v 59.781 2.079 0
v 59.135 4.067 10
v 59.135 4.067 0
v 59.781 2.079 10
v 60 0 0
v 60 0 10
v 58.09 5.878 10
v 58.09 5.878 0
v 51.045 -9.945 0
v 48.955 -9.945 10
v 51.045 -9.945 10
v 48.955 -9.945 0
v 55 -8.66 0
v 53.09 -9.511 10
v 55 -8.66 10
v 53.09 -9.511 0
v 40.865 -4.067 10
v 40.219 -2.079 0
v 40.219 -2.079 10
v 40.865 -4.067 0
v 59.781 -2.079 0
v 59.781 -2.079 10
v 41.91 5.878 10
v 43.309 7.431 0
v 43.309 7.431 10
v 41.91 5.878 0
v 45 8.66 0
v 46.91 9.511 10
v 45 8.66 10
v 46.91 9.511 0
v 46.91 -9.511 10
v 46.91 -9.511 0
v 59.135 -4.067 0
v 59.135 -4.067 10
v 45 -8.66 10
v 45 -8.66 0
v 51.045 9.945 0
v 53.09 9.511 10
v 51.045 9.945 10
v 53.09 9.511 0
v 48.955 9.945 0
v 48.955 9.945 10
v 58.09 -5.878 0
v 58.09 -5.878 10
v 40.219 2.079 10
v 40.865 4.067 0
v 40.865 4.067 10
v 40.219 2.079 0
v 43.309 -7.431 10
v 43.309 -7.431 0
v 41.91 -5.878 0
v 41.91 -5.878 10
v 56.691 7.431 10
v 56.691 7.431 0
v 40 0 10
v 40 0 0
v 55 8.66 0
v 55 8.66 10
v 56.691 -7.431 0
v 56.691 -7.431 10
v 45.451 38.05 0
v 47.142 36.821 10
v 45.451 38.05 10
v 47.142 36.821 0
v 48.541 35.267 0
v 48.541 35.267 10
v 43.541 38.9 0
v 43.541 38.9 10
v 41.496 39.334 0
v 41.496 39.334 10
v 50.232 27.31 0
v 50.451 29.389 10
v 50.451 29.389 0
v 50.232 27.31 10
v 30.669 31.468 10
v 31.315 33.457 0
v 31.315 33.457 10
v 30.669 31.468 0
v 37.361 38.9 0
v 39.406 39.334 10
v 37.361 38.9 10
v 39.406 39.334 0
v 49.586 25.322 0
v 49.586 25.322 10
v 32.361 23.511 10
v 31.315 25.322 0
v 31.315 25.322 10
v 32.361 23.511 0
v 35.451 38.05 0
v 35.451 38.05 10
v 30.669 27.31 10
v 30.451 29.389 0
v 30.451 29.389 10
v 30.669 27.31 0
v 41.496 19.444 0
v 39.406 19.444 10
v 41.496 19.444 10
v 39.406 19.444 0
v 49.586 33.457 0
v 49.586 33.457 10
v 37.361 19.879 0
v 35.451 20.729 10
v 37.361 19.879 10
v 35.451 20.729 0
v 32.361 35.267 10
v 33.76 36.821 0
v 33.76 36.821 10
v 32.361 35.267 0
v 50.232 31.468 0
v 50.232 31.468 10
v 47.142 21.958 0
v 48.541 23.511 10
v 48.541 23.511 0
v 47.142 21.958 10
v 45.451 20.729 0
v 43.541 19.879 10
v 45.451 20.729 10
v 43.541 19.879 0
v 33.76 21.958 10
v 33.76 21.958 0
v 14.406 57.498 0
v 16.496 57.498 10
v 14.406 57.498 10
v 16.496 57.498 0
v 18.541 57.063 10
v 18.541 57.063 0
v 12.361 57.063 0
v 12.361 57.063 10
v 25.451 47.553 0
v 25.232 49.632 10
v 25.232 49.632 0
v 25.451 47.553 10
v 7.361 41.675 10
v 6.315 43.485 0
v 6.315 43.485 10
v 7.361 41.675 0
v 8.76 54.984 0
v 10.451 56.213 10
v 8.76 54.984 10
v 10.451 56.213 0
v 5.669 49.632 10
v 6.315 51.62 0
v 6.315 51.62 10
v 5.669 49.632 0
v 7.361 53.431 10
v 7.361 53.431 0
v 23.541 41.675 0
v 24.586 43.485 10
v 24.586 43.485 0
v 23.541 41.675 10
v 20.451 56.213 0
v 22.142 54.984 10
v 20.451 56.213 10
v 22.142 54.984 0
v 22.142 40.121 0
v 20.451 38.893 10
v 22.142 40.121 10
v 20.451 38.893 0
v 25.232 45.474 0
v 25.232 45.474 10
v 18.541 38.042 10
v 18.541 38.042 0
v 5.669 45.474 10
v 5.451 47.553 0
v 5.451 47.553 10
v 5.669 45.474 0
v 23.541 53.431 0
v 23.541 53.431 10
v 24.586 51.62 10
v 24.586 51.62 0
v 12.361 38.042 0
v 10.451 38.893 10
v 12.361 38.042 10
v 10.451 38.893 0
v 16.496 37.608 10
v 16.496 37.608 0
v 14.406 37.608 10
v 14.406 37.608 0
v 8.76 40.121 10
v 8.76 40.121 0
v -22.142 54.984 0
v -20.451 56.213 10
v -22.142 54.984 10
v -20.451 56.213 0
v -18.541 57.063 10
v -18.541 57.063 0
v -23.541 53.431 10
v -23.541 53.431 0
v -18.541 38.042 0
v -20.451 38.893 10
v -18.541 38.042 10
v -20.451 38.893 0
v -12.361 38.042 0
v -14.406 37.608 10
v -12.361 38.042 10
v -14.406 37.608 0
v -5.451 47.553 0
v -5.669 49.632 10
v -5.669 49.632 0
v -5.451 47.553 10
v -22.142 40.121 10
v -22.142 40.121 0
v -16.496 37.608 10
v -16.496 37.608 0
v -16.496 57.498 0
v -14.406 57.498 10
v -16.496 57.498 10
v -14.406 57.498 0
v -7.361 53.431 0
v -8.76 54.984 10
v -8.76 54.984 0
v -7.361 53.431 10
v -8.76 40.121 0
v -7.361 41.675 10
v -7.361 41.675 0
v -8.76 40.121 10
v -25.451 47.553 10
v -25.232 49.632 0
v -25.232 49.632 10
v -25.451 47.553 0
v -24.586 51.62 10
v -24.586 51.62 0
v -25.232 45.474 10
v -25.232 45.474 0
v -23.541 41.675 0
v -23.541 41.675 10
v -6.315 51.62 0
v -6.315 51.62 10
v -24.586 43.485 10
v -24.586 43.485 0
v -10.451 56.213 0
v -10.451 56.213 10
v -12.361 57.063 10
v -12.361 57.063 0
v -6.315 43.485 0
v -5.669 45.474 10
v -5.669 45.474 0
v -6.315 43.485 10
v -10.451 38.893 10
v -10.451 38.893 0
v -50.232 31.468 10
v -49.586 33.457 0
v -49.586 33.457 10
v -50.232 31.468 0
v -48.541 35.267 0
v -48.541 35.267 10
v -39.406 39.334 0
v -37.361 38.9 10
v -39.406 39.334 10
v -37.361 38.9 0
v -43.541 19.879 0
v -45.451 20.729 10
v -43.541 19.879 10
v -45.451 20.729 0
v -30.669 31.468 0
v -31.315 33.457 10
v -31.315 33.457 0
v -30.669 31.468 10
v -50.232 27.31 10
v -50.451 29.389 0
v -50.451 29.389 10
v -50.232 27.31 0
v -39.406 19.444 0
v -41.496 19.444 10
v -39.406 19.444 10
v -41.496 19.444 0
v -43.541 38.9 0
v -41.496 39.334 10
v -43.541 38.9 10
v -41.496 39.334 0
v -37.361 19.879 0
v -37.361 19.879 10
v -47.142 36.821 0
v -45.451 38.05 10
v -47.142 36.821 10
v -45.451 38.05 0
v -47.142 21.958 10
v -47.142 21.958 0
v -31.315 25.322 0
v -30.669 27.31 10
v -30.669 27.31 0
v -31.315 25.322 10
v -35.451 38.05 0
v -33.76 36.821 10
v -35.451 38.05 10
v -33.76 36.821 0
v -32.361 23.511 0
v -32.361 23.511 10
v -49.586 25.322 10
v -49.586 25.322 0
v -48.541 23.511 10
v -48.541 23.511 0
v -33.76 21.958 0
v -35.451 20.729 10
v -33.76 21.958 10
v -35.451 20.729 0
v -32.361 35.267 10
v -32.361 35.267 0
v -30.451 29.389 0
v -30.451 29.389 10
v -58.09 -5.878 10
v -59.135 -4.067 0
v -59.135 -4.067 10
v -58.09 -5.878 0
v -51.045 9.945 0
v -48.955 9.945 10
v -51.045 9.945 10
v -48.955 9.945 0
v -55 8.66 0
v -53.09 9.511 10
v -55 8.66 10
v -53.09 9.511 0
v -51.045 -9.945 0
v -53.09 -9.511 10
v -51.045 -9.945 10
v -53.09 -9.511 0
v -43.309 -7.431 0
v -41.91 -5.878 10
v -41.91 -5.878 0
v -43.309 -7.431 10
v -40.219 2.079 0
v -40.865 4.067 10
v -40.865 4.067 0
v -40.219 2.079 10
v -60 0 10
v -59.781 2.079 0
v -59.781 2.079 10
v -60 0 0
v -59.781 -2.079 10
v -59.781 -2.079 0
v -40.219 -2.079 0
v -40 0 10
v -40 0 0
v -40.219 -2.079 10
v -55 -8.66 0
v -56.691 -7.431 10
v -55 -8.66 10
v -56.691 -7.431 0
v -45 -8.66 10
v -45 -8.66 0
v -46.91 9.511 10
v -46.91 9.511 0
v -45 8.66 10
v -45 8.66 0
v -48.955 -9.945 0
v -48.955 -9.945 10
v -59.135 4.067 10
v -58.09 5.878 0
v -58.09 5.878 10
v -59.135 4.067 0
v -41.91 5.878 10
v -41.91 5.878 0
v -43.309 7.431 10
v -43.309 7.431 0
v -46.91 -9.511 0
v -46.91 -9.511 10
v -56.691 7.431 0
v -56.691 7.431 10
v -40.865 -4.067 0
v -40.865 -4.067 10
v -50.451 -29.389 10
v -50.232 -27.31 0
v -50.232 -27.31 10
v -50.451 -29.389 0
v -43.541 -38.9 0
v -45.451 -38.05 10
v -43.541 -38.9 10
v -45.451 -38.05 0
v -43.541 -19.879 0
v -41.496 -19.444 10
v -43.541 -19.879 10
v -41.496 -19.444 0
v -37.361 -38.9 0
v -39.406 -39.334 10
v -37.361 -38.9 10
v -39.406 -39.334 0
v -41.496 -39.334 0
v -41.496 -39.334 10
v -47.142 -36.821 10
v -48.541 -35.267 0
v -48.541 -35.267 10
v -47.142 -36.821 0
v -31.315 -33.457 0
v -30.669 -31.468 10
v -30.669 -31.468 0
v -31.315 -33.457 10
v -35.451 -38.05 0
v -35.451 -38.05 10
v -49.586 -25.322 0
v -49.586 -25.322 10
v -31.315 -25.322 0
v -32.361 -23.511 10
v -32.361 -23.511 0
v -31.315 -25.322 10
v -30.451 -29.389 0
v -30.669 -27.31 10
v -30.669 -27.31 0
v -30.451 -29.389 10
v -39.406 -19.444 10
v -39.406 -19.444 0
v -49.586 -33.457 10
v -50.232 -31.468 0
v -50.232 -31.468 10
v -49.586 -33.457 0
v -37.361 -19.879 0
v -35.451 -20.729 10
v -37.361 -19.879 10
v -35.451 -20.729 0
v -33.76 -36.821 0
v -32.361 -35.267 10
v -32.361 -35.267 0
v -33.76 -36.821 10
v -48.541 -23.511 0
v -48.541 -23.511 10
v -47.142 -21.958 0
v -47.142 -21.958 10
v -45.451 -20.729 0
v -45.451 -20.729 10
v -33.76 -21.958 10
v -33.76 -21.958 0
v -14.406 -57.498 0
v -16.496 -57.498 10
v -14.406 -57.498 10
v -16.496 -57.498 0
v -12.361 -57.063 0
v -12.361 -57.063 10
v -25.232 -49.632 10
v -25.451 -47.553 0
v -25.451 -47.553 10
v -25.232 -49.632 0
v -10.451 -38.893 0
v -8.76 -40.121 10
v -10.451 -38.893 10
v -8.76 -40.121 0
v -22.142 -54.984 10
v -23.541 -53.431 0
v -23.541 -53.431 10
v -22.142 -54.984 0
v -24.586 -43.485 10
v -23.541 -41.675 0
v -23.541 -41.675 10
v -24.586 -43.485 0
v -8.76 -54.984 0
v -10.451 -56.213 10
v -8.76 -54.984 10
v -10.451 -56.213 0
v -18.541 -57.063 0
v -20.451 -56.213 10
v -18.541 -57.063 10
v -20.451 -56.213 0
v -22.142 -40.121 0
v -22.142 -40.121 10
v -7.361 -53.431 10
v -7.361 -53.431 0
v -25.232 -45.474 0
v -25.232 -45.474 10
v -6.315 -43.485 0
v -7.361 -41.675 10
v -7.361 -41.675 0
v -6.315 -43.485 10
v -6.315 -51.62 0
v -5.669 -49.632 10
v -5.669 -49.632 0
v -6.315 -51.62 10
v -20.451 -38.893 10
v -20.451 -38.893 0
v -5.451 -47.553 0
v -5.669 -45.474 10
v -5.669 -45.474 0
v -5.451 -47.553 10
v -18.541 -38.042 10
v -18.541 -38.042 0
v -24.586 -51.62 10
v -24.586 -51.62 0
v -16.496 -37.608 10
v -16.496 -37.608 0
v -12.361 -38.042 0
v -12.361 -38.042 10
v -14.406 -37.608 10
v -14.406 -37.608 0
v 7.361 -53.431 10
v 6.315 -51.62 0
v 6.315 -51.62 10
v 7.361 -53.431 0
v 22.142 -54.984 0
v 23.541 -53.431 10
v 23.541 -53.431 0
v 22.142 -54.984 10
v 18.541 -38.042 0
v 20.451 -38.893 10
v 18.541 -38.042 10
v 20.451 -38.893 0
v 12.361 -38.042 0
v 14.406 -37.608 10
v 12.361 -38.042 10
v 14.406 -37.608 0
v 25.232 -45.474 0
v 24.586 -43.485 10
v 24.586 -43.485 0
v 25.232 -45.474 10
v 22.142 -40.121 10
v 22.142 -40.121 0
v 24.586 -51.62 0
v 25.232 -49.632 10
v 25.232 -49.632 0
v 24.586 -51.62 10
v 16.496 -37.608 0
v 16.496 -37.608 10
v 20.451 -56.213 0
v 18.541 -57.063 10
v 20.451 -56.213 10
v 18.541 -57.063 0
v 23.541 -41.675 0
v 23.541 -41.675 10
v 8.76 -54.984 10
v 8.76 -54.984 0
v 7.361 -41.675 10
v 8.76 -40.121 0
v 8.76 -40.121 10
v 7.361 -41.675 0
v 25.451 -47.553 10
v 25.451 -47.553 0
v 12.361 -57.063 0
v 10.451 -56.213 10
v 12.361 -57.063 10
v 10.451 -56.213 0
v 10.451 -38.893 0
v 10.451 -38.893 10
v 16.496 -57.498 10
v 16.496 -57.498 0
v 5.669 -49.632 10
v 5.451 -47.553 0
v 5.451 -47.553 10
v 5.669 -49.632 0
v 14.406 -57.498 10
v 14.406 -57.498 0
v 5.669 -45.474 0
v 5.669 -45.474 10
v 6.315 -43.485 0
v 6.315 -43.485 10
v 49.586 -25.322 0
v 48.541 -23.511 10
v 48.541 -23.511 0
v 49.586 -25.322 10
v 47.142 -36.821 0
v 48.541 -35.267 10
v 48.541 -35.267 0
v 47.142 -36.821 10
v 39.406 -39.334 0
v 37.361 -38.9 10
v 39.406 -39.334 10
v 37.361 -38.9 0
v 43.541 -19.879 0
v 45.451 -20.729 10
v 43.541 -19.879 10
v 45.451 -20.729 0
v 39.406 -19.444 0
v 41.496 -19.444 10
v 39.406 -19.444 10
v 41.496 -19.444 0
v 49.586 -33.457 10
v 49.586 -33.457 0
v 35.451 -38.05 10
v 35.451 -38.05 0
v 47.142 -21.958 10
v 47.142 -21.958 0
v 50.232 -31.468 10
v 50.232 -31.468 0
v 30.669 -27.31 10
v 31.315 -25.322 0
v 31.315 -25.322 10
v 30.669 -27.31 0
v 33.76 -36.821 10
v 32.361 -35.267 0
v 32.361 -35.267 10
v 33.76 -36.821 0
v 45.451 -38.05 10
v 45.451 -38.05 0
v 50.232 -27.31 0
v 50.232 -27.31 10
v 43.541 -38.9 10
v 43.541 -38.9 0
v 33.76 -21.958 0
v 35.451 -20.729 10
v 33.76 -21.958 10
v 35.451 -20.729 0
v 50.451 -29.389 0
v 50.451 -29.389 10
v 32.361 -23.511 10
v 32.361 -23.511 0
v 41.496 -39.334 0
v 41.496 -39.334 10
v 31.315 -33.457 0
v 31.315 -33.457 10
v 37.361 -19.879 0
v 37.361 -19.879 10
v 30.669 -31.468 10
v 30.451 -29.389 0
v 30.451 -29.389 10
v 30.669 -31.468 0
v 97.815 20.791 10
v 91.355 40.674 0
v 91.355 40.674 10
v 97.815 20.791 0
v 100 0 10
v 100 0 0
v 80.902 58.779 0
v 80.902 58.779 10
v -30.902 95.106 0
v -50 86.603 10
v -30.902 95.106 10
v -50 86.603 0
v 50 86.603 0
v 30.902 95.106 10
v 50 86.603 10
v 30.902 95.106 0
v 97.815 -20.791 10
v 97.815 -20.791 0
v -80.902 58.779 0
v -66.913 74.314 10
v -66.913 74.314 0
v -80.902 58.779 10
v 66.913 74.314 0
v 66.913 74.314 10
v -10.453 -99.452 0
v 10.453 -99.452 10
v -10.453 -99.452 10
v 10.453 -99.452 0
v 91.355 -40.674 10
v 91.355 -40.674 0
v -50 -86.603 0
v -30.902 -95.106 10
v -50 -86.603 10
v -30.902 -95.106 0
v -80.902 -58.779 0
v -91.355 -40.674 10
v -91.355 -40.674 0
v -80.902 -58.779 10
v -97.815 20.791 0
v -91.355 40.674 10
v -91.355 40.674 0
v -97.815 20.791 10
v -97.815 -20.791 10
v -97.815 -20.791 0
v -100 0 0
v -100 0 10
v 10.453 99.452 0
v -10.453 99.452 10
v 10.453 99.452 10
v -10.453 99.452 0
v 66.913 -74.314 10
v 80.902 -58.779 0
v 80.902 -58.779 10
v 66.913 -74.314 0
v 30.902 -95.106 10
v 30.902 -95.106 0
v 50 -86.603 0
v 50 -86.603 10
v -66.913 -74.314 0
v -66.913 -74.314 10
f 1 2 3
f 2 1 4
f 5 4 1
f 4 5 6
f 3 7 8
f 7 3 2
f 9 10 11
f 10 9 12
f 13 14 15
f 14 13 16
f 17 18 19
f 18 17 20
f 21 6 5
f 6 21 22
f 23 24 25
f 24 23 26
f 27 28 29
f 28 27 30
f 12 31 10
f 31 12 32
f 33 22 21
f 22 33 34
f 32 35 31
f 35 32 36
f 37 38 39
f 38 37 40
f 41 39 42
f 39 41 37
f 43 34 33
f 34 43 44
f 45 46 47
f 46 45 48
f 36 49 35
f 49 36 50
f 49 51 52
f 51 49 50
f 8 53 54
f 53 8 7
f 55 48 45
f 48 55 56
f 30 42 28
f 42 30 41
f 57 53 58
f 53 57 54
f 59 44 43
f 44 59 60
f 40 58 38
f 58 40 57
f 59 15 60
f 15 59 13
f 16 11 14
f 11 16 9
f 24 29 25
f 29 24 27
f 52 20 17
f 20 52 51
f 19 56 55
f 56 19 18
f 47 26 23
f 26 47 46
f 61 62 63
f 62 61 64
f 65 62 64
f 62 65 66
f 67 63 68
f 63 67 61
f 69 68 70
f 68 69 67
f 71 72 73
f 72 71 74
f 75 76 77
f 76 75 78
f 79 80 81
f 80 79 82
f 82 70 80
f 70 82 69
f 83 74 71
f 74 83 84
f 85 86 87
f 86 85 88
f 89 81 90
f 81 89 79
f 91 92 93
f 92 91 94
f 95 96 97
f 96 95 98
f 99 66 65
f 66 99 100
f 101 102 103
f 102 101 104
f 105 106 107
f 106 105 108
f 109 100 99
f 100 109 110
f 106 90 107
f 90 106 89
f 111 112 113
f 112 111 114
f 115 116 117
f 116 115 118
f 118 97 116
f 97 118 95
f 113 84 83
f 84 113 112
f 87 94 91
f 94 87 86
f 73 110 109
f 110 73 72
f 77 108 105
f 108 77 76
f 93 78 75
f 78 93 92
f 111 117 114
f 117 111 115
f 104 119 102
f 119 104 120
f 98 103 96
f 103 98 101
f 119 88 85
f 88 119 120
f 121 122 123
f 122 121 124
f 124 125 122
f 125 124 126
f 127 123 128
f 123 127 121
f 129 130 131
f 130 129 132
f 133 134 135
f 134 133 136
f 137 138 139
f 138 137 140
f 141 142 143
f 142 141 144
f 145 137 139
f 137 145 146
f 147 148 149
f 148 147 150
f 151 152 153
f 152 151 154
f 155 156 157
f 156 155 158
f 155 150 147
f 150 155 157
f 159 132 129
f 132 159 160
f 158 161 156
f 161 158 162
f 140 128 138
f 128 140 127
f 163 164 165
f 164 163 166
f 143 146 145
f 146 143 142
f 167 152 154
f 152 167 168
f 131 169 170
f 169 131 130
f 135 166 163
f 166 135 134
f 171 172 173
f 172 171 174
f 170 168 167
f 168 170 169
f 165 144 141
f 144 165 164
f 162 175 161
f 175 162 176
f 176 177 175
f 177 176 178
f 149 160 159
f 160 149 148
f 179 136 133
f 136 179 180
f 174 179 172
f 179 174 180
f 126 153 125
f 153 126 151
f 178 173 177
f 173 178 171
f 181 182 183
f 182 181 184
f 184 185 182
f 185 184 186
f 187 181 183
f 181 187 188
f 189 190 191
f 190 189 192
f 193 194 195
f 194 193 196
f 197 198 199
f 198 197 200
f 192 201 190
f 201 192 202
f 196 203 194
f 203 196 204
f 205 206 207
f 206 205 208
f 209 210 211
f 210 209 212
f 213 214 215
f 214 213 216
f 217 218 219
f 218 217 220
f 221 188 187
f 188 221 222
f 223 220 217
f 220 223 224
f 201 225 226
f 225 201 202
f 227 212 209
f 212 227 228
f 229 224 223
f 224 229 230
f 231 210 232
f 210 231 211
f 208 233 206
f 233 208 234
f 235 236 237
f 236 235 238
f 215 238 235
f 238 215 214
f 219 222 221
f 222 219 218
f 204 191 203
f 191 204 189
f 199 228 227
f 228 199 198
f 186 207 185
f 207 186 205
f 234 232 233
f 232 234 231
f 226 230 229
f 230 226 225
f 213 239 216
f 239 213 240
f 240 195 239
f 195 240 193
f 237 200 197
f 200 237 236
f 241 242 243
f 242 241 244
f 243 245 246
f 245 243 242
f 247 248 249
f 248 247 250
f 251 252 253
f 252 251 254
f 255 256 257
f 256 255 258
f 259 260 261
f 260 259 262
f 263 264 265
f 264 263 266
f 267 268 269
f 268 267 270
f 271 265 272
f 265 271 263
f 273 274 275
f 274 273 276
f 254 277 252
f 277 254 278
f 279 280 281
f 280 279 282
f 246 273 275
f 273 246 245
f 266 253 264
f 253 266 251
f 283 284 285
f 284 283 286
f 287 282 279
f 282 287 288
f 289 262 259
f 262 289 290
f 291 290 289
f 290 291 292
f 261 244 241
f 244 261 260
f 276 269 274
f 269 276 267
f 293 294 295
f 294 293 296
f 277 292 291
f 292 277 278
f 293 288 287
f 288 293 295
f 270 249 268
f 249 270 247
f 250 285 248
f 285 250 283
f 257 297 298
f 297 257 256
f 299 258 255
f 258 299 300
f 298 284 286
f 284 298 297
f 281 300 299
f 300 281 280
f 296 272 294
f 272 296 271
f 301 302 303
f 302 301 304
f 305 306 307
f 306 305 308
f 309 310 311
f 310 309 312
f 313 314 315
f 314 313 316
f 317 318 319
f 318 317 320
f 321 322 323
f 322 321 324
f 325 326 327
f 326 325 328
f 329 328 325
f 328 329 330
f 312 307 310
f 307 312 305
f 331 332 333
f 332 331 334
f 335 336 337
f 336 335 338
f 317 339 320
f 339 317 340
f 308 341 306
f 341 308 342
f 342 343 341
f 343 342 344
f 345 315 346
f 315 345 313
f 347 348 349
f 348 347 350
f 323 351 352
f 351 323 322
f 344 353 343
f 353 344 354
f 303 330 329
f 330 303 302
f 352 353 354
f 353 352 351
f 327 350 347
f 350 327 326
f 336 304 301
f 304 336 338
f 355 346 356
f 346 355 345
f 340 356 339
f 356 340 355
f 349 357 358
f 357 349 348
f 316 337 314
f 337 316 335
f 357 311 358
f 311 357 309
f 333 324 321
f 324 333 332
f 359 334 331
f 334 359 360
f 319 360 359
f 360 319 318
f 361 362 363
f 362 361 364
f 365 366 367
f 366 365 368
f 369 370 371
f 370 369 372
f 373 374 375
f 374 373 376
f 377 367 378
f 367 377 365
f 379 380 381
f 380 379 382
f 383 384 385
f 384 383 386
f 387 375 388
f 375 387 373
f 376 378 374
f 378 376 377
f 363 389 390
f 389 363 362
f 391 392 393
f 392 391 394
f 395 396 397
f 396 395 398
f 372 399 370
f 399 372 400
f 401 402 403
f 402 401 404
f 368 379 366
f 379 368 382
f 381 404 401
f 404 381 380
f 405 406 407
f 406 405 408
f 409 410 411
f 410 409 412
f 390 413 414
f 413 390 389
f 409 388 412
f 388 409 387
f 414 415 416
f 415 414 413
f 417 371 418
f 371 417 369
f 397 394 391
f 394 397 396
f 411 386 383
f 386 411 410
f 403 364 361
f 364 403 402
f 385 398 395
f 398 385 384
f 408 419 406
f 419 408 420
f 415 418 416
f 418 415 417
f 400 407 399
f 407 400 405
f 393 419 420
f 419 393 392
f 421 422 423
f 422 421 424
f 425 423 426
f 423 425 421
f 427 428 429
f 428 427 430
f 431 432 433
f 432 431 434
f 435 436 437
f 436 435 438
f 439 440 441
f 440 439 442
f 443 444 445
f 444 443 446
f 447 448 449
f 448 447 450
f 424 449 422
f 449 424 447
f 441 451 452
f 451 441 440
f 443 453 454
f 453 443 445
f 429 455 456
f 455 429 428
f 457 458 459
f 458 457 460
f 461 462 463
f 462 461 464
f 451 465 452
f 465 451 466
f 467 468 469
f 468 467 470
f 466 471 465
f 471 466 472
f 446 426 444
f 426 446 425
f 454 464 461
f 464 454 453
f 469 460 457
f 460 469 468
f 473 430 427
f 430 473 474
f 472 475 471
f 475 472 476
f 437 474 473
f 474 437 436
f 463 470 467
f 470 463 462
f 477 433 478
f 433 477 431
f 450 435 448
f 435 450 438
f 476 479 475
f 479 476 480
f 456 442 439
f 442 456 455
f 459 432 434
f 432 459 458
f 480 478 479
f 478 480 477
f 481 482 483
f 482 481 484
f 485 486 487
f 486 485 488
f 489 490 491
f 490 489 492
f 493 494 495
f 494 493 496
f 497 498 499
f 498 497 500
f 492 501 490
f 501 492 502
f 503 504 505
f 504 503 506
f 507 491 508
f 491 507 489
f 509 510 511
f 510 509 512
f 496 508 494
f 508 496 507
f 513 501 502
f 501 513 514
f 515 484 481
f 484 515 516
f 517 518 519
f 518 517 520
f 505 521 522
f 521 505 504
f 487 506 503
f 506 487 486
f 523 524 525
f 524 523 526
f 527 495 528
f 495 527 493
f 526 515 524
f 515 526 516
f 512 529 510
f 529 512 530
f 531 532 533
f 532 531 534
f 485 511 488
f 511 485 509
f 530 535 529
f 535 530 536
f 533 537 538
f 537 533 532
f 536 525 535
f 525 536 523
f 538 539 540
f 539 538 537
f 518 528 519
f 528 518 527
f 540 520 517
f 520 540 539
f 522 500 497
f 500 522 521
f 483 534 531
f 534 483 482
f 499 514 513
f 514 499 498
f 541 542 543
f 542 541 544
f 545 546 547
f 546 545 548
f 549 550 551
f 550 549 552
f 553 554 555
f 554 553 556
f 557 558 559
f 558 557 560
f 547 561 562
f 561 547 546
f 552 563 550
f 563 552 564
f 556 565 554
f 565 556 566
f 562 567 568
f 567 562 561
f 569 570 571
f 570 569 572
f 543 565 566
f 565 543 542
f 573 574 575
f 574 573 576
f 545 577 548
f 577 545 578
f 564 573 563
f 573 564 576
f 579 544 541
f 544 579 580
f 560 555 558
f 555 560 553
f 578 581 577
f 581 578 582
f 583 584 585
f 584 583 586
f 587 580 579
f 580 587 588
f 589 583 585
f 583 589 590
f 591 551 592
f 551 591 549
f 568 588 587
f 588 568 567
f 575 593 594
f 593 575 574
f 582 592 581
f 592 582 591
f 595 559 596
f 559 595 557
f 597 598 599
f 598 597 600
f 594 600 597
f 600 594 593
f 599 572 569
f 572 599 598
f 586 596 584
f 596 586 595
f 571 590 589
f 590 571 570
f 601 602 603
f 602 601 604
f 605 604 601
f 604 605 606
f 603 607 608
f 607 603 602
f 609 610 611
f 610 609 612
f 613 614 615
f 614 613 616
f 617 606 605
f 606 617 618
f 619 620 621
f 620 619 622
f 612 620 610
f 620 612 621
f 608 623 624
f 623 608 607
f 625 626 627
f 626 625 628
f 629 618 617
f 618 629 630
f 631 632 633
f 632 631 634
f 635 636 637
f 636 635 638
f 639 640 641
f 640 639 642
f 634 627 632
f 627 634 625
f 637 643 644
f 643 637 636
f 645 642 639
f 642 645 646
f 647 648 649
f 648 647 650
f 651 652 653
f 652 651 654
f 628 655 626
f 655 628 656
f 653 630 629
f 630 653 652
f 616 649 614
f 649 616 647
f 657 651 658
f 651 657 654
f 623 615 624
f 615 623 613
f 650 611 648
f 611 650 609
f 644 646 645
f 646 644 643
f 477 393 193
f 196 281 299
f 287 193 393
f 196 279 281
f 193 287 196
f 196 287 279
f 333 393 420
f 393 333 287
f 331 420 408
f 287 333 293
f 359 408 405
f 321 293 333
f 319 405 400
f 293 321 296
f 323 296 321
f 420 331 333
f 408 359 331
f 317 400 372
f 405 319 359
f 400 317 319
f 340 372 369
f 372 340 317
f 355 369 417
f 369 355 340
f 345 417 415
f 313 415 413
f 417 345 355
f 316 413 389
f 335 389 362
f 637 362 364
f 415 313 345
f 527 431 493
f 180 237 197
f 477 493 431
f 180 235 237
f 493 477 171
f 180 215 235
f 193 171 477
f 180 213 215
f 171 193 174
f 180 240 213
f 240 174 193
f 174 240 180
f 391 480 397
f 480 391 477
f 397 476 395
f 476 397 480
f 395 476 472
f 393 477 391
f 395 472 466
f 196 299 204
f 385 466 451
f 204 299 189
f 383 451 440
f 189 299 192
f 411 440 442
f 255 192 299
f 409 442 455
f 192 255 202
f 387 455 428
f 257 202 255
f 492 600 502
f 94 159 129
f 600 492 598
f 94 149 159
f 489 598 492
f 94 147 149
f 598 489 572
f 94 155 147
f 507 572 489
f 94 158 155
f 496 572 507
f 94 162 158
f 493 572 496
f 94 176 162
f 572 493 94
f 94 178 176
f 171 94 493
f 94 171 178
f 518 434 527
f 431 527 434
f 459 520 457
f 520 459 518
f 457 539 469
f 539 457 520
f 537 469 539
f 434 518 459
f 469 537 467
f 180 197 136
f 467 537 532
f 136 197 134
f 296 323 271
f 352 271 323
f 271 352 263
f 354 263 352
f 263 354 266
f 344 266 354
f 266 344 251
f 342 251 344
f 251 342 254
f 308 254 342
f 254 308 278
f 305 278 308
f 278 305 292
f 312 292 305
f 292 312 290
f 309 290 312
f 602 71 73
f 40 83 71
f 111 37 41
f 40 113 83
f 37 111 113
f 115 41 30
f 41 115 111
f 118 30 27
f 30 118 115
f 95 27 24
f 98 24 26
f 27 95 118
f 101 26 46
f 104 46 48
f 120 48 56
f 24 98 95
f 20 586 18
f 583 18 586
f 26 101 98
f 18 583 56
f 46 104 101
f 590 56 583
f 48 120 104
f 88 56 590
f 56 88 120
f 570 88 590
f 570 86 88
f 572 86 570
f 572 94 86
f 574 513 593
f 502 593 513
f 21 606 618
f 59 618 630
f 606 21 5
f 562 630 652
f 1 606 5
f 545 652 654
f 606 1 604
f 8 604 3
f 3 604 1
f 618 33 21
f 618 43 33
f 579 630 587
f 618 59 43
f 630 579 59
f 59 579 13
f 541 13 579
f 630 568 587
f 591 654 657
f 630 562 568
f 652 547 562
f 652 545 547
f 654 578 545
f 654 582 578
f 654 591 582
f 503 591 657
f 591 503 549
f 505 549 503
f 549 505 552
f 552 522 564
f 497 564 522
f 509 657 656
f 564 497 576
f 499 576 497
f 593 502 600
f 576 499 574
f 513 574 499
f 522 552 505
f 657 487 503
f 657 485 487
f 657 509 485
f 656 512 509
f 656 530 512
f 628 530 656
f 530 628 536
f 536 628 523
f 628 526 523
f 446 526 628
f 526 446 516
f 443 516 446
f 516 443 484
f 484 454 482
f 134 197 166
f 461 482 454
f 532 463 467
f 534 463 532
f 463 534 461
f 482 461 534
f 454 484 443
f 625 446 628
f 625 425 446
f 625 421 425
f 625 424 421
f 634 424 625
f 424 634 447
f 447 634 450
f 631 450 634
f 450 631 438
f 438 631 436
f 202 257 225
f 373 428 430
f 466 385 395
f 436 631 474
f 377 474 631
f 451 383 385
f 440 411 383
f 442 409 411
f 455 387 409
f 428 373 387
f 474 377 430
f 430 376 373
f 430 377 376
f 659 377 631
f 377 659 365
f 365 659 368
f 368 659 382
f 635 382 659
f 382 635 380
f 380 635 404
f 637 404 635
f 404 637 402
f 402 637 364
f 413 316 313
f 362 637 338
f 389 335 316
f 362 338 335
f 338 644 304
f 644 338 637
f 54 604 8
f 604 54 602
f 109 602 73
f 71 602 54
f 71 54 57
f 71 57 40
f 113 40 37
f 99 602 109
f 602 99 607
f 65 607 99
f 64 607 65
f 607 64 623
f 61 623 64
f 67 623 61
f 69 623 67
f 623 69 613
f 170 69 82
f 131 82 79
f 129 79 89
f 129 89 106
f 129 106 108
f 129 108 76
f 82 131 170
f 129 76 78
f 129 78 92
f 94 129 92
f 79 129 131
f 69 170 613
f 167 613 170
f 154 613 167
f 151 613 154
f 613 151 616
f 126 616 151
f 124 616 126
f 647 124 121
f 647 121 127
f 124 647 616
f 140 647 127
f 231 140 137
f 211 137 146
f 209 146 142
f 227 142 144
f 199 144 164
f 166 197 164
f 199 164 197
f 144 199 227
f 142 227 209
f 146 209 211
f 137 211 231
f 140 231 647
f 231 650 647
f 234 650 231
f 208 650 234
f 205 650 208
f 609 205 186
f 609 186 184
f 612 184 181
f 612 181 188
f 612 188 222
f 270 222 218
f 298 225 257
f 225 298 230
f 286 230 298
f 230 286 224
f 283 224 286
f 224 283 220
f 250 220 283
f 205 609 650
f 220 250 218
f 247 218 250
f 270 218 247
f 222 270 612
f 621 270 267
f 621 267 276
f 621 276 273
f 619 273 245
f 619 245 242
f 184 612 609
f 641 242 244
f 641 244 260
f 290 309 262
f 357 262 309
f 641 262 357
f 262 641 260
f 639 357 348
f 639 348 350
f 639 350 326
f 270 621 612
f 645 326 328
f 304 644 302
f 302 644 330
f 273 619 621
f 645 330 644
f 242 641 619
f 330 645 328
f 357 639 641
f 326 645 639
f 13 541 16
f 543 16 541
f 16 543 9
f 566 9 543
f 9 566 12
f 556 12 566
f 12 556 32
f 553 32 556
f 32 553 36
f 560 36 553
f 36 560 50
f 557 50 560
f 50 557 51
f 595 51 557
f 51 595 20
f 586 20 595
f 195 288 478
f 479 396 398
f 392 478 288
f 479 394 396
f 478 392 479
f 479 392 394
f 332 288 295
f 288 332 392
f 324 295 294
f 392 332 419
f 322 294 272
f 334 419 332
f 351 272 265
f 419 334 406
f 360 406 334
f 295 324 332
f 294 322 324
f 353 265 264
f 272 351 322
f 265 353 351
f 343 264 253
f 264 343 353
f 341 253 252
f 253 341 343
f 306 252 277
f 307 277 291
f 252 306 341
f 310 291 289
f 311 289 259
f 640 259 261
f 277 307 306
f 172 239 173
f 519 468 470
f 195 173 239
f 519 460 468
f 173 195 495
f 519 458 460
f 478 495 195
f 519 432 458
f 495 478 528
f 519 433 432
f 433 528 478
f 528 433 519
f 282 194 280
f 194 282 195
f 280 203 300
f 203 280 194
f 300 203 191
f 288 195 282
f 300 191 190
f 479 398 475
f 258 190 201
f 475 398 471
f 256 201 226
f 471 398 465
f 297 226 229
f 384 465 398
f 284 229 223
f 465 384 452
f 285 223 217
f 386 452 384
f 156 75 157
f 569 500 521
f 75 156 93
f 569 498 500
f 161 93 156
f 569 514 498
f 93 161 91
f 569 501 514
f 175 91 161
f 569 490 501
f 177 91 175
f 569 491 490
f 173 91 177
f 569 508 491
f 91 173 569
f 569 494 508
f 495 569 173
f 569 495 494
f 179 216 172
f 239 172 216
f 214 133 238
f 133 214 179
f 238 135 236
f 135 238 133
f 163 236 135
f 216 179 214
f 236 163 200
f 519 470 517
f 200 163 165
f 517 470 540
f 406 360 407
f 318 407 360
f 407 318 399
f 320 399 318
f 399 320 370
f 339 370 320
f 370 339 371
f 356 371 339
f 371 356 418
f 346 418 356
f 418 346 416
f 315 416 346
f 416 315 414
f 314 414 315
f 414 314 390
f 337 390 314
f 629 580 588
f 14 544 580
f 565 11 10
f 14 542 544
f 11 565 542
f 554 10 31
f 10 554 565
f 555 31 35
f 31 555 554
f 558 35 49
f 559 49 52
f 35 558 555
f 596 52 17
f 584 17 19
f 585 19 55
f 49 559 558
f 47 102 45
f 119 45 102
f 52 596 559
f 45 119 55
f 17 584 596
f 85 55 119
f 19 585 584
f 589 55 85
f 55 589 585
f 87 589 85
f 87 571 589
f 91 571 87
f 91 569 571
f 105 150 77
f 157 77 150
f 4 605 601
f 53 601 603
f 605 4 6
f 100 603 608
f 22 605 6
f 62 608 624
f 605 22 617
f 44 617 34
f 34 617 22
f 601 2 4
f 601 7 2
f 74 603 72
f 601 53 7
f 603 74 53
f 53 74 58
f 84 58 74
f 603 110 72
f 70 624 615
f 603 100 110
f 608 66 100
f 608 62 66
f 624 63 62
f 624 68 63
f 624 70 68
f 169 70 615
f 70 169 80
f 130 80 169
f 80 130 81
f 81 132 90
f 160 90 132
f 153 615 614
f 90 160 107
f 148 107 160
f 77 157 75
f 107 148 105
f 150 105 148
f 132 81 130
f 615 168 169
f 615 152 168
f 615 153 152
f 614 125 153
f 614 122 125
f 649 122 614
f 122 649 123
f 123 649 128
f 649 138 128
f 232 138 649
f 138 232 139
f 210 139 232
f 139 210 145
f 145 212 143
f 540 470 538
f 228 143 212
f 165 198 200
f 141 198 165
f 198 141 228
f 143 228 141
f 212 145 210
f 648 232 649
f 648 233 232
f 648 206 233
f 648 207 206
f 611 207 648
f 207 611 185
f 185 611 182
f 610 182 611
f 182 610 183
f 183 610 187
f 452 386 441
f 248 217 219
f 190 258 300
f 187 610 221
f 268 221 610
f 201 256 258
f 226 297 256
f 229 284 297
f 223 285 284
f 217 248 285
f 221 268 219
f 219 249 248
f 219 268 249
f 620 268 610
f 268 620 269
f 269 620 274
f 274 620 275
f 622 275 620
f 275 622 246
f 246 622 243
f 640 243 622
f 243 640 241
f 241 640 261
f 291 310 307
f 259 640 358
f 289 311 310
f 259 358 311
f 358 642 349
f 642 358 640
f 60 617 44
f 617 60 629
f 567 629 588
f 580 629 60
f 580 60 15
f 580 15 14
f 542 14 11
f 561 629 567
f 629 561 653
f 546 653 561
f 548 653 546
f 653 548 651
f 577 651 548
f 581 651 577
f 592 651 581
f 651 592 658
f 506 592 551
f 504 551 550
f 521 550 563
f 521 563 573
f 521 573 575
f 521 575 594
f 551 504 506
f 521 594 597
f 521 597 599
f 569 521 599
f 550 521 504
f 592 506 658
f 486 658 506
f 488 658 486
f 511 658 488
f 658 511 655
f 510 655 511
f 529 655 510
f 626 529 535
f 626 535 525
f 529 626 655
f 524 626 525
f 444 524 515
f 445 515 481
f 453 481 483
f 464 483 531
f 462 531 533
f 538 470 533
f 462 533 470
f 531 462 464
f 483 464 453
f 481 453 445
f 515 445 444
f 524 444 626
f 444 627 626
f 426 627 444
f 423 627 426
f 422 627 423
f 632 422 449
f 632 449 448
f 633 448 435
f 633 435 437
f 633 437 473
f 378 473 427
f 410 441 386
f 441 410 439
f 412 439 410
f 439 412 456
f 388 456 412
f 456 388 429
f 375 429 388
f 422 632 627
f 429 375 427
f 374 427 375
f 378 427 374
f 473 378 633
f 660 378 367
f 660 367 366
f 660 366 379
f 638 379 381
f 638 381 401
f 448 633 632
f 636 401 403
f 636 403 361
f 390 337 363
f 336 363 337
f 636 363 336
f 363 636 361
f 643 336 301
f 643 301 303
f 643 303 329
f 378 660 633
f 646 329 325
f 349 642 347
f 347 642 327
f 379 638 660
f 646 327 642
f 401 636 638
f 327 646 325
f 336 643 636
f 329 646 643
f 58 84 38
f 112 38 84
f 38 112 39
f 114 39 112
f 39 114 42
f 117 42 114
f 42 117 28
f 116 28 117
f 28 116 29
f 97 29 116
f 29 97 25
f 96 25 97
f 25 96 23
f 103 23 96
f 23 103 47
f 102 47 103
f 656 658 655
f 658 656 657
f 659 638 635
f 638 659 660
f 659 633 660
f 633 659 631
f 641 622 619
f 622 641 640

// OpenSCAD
module roata(raza, grosime, raza_gaura, nr_gauri)
    {
        difference() {
        cylinder(h=grosime, r=raza);
            for(i=[0:360/nr_gauri:359])
                rotate([0,0,i])
            translate([raza/2,0,-1])
            cylinder(r=raza_gaura, h=grosime+2);
        }
            }
 roata(raza=100, grosime=10, raza_gaura=10, nr_gauri=10);
        
